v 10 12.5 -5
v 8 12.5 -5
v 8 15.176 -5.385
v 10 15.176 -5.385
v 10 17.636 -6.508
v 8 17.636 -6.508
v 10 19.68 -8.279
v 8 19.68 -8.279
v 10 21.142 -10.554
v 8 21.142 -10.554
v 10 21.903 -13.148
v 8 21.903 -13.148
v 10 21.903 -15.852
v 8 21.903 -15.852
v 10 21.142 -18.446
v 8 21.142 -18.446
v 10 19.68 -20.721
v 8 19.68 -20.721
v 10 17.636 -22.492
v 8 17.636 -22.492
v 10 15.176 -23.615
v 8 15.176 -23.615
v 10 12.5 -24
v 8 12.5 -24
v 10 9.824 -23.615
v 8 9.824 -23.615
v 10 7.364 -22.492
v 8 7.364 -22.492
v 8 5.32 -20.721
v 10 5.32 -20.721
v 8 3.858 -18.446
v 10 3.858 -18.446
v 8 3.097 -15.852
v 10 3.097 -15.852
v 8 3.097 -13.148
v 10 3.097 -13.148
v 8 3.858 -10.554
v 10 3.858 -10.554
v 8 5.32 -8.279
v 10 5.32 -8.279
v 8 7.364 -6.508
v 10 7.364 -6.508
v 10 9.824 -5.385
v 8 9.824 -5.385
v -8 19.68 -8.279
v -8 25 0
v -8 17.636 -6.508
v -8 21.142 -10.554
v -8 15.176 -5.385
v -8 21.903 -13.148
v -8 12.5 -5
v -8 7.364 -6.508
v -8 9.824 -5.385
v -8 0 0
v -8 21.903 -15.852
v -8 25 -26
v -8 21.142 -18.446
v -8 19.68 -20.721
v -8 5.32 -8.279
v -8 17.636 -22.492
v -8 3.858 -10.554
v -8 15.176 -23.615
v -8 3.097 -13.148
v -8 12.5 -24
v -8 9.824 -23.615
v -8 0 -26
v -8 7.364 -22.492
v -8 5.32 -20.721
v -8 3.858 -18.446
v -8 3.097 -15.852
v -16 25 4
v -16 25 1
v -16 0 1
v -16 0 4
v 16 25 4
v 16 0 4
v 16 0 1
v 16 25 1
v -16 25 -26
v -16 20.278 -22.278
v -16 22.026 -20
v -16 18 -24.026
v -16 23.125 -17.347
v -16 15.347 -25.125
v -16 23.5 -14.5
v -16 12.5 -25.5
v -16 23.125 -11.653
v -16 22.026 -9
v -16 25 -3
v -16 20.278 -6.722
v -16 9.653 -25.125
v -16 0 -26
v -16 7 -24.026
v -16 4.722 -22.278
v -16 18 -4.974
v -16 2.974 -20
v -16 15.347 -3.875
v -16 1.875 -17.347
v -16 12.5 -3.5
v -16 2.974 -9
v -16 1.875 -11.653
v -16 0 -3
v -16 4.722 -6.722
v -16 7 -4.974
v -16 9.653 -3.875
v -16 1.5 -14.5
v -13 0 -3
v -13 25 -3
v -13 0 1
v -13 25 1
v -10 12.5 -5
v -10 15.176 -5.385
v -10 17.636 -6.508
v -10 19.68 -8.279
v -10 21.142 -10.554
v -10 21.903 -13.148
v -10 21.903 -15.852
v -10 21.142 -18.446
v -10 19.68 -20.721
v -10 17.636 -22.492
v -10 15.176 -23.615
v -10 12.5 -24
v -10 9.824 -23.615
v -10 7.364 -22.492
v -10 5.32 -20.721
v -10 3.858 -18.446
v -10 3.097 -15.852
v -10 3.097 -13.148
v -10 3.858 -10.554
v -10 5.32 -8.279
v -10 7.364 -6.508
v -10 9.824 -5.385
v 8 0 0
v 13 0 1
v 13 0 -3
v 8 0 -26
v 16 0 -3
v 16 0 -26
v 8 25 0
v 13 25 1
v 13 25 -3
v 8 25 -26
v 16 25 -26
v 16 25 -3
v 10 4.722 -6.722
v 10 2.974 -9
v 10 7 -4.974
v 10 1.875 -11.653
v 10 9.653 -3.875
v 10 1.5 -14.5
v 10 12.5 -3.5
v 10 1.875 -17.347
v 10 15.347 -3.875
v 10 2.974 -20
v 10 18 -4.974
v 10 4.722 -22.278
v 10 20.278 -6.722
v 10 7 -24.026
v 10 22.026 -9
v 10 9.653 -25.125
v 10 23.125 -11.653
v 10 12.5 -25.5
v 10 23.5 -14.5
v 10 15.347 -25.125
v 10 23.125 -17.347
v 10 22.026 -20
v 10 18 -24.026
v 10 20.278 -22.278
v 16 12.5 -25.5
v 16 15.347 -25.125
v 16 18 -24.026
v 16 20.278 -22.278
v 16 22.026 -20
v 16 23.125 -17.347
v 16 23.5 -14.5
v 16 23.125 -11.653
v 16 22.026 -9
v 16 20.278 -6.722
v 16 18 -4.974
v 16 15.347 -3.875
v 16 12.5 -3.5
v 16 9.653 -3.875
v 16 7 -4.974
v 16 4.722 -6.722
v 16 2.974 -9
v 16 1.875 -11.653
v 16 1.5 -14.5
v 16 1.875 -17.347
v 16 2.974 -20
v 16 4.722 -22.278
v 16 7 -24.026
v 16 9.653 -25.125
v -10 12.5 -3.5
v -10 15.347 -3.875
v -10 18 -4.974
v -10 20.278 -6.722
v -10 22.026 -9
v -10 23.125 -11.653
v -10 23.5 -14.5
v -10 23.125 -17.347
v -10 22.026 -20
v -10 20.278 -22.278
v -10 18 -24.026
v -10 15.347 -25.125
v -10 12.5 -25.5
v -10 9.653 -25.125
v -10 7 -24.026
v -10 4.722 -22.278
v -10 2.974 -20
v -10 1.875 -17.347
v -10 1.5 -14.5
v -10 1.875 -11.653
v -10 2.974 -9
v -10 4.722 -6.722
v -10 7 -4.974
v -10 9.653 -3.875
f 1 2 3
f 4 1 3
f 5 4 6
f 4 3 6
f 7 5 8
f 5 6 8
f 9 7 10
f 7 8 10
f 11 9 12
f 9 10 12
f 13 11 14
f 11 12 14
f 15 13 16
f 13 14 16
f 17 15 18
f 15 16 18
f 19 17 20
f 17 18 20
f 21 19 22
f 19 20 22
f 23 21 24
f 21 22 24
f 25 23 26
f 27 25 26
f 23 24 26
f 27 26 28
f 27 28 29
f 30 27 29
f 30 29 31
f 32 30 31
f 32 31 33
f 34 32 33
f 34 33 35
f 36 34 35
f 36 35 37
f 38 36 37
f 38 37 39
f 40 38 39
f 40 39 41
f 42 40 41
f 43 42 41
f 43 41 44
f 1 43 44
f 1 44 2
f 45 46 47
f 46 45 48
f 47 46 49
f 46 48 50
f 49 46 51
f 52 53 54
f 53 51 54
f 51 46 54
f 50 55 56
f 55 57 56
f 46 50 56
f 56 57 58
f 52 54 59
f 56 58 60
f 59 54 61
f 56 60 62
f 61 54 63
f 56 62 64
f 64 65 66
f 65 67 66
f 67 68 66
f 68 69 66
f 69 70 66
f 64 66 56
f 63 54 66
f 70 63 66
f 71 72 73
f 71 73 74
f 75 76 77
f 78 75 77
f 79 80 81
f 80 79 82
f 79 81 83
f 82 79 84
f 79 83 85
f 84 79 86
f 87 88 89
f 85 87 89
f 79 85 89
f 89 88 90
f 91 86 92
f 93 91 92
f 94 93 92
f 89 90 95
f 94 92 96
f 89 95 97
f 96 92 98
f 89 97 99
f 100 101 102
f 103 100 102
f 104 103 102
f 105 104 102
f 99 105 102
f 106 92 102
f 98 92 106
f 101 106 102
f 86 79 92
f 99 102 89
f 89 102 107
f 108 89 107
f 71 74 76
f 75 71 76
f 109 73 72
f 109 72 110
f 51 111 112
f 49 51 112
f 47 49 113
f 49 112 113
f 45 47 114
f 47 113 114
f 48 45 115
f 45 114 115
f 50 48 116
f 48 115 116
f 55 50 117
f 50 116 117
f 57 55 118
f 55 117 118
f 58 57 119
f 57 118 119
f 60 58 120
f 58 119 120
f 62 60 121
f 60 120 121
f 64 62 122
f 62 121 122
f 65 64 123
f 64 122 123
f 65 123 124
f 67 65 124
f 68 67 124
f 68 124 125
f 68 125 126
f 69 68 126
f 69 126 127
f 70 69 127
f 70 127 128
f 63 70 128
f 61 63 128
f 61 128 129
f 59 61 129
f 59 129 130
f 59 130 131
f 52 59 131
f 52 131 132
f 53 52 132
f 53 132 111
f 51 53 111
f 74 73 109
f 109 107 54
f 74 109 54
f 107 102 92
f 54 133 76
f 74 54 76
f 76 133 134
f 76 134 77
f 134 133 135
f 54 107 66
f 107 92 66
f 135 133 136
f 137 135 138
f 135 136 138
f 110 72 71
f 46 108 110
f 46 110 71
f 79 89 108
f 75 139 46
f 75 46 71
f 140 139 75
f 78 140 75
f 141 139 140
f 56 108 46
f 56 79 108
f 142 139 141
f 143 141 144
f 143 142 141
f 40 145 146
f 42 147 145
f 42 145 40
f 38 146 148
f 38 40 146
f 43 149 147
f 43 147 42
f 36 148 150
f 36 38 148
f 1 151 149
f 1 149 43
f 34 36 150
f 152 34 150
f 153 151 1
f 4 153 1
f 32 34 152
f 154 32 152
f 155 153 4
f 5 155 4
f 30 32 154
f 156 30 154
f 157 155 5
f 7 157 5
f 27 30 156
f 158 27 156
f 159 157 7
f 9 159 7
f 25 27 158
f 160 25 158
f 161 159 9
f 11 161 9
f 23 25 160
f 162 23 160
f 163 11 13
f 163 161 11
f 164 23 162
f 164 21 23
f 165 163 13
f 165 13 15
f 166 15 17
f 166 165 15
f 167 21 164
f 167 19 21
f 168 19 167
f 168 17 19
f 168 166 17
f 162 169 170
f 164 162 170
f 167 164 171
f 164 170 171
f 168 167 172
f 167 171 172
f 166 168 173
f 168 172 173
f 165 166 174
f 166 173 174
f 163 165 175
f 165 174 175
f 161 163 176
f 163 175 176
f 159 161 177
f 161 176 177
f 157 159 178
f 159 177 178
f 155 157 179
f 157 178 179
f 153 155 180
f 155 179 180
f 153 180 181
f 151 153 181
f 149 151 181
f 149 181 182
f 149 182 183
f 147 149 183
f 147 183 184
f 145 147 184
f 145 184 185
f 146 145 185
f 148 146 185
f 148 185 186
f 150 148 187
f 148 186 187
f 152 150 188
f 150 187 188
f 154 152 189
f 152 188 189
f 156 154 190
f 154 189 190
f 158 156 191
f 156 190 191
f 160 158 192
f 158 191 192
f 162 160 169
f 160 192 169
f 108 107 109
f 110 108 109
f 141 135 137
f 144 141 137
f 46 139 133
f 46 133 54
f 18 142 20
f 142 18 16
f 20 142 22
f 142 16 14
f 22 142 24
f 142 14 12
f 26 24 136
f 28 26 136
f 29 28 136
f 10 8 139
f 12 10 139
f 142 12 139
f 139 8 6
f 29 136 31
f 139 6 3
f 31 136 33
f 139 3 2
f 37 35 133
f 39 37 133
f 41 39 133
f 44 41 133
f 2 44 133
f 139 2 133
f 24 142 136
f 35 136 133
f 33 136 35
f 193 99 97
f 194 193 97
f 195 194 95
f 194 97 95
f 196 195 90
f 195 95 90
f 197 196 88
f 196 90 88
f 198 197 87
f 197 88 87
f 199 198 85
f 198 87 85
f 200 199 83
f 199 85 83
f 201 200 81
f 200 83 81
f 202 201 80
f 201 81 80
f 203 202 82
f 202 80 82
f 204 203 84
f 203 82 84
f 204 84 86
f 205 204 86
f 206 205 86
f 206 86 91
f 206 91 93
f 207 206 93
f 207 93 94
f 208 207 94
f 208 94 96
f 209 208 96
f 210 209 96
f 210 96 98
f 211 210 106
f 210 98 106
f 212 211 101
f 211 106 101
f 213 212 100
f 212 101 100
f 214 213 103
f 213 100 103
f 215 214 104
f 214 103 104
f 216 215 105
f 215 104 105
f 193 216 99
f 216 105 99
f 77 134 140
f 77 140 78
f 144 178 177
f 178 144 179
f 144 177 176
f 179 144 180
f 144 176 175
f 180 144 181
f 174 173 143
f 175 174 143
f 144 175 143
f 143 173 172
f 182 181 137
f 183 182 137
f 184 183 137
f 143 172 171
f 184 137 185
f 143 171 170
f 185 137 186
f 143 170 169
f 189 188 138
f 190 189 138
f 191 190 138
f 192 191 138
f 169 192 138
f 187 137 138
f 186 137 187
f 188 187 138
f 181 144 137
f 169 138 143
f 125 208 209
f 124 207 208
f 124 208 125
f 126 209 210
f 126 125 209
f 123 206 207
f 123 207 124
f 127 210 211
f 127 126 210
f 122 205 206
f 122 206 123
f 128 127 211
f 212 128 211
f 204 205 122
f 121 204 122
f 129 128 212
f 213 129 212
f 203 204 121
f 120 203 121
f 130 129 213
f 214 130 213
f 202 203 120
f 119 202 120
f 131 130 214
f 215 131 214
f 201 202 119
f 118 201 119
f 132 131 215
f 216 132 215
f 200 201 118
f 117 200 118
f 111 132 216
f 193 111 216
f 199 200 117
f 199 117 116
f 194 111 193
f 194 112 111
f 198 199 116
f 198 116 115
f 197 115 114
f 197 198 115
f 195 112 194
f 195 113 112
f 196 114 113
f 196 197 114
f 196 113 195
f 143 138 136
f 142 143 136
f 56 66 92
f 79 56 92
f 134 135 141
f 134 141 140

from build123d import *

# Parameters (mm, degrees)
AUFSATZ_LINEAR_AUSTRAGEN1_DEPTH = 25
SKIZZE2_W                       = 3
SKIZZE2_H                       = 4
SCHNITT_LINEAR_AUSTRAGEN1_DEPTH = 25
SKIZZE3_R                       = 9.5
SCHNITT_LINEAR_AUSTRAGEN2_DEPTH = 35
SKIZZE4_R                       = 11
SCHNITT_LINEAR_AUSTRAGEN3_DEPTH = 6
SKIZZE5_R                       = 11
SCHNITT_LINEAR_AUSTRAGEN4_DEPTH = 6


with BuildPart() as part:
    # Skizze1 → Aufsatz-Linear austragen1 (new body)
    with BuildSketch(Plane(origin=(0, 0, 0), x_dir=(1, 0, 0), z_dir=(0, 1, 0))):
        Polygon((-8, 0), (-8, 26), (-16, 26), (-16, -4), (16, -4), (16, 26), (8, 26), (8, 0), align=None)
    extrude(amount=AUFSATZ_LINEAR_AUSTRAGEN1_DEPTH)

    # Skizze2 → Schnitt-Linear austragen1 (cut)
    with BuildSketch(Plane.XZ):
        with Locations((14.5, -1)):
            Rectangle(SKIZZE2_W, SKIZZE2_H)
        with Locations((-14.5, -1)):
            Rectangle(SKIZZE2_W, SKIZZE2_H)
    extrude(amount=-SCHNITT_LINEAR_AUSTRAGEN1_DEPTH, mode=Mode.SUBTRACT)

    # Skizze3 → Schnitt-Linear austragen2 (cut)
    with BuildSketch(Plane.ZY.offset(16)):
        with Locations((-14.5, 12.5)):
            Circle(SKIZZE3_R)
    extrude(amount=-SCHNITT_LINEAR_AUSTRAGEN2_DEPTH, mode=Mode.SUBTRACT)

    # Skizze4 → Schnitt-Linear austragen3 (cut)
    with BuildSketch(Plane.ZY.offset(16)):
        with Locations((-14.5, 12.5)):
            Circle(SKIZZE4_R)
    extrude(amount=-SCHNITT_LINEAR_AUSTRAGEN3_DEPTH, mode=Mode.SUBTRACT)

    # Skizze5 → Schnitt-Linear austragen4 (cut)
    with BuildSketch(Plane(origin=(16, 0, 0), x_dir=(0, 0, -1), z_dir=(1, 0, 0))):
        with Locations((14.5, 12.5)):
            Circle(SKIZZE5_R)
    extrude(amount=-SCHNITT_LINEAR_AUSTRAGEN4_DEPTH, mode=Mode.SUBTRACT)


solid = part.part
